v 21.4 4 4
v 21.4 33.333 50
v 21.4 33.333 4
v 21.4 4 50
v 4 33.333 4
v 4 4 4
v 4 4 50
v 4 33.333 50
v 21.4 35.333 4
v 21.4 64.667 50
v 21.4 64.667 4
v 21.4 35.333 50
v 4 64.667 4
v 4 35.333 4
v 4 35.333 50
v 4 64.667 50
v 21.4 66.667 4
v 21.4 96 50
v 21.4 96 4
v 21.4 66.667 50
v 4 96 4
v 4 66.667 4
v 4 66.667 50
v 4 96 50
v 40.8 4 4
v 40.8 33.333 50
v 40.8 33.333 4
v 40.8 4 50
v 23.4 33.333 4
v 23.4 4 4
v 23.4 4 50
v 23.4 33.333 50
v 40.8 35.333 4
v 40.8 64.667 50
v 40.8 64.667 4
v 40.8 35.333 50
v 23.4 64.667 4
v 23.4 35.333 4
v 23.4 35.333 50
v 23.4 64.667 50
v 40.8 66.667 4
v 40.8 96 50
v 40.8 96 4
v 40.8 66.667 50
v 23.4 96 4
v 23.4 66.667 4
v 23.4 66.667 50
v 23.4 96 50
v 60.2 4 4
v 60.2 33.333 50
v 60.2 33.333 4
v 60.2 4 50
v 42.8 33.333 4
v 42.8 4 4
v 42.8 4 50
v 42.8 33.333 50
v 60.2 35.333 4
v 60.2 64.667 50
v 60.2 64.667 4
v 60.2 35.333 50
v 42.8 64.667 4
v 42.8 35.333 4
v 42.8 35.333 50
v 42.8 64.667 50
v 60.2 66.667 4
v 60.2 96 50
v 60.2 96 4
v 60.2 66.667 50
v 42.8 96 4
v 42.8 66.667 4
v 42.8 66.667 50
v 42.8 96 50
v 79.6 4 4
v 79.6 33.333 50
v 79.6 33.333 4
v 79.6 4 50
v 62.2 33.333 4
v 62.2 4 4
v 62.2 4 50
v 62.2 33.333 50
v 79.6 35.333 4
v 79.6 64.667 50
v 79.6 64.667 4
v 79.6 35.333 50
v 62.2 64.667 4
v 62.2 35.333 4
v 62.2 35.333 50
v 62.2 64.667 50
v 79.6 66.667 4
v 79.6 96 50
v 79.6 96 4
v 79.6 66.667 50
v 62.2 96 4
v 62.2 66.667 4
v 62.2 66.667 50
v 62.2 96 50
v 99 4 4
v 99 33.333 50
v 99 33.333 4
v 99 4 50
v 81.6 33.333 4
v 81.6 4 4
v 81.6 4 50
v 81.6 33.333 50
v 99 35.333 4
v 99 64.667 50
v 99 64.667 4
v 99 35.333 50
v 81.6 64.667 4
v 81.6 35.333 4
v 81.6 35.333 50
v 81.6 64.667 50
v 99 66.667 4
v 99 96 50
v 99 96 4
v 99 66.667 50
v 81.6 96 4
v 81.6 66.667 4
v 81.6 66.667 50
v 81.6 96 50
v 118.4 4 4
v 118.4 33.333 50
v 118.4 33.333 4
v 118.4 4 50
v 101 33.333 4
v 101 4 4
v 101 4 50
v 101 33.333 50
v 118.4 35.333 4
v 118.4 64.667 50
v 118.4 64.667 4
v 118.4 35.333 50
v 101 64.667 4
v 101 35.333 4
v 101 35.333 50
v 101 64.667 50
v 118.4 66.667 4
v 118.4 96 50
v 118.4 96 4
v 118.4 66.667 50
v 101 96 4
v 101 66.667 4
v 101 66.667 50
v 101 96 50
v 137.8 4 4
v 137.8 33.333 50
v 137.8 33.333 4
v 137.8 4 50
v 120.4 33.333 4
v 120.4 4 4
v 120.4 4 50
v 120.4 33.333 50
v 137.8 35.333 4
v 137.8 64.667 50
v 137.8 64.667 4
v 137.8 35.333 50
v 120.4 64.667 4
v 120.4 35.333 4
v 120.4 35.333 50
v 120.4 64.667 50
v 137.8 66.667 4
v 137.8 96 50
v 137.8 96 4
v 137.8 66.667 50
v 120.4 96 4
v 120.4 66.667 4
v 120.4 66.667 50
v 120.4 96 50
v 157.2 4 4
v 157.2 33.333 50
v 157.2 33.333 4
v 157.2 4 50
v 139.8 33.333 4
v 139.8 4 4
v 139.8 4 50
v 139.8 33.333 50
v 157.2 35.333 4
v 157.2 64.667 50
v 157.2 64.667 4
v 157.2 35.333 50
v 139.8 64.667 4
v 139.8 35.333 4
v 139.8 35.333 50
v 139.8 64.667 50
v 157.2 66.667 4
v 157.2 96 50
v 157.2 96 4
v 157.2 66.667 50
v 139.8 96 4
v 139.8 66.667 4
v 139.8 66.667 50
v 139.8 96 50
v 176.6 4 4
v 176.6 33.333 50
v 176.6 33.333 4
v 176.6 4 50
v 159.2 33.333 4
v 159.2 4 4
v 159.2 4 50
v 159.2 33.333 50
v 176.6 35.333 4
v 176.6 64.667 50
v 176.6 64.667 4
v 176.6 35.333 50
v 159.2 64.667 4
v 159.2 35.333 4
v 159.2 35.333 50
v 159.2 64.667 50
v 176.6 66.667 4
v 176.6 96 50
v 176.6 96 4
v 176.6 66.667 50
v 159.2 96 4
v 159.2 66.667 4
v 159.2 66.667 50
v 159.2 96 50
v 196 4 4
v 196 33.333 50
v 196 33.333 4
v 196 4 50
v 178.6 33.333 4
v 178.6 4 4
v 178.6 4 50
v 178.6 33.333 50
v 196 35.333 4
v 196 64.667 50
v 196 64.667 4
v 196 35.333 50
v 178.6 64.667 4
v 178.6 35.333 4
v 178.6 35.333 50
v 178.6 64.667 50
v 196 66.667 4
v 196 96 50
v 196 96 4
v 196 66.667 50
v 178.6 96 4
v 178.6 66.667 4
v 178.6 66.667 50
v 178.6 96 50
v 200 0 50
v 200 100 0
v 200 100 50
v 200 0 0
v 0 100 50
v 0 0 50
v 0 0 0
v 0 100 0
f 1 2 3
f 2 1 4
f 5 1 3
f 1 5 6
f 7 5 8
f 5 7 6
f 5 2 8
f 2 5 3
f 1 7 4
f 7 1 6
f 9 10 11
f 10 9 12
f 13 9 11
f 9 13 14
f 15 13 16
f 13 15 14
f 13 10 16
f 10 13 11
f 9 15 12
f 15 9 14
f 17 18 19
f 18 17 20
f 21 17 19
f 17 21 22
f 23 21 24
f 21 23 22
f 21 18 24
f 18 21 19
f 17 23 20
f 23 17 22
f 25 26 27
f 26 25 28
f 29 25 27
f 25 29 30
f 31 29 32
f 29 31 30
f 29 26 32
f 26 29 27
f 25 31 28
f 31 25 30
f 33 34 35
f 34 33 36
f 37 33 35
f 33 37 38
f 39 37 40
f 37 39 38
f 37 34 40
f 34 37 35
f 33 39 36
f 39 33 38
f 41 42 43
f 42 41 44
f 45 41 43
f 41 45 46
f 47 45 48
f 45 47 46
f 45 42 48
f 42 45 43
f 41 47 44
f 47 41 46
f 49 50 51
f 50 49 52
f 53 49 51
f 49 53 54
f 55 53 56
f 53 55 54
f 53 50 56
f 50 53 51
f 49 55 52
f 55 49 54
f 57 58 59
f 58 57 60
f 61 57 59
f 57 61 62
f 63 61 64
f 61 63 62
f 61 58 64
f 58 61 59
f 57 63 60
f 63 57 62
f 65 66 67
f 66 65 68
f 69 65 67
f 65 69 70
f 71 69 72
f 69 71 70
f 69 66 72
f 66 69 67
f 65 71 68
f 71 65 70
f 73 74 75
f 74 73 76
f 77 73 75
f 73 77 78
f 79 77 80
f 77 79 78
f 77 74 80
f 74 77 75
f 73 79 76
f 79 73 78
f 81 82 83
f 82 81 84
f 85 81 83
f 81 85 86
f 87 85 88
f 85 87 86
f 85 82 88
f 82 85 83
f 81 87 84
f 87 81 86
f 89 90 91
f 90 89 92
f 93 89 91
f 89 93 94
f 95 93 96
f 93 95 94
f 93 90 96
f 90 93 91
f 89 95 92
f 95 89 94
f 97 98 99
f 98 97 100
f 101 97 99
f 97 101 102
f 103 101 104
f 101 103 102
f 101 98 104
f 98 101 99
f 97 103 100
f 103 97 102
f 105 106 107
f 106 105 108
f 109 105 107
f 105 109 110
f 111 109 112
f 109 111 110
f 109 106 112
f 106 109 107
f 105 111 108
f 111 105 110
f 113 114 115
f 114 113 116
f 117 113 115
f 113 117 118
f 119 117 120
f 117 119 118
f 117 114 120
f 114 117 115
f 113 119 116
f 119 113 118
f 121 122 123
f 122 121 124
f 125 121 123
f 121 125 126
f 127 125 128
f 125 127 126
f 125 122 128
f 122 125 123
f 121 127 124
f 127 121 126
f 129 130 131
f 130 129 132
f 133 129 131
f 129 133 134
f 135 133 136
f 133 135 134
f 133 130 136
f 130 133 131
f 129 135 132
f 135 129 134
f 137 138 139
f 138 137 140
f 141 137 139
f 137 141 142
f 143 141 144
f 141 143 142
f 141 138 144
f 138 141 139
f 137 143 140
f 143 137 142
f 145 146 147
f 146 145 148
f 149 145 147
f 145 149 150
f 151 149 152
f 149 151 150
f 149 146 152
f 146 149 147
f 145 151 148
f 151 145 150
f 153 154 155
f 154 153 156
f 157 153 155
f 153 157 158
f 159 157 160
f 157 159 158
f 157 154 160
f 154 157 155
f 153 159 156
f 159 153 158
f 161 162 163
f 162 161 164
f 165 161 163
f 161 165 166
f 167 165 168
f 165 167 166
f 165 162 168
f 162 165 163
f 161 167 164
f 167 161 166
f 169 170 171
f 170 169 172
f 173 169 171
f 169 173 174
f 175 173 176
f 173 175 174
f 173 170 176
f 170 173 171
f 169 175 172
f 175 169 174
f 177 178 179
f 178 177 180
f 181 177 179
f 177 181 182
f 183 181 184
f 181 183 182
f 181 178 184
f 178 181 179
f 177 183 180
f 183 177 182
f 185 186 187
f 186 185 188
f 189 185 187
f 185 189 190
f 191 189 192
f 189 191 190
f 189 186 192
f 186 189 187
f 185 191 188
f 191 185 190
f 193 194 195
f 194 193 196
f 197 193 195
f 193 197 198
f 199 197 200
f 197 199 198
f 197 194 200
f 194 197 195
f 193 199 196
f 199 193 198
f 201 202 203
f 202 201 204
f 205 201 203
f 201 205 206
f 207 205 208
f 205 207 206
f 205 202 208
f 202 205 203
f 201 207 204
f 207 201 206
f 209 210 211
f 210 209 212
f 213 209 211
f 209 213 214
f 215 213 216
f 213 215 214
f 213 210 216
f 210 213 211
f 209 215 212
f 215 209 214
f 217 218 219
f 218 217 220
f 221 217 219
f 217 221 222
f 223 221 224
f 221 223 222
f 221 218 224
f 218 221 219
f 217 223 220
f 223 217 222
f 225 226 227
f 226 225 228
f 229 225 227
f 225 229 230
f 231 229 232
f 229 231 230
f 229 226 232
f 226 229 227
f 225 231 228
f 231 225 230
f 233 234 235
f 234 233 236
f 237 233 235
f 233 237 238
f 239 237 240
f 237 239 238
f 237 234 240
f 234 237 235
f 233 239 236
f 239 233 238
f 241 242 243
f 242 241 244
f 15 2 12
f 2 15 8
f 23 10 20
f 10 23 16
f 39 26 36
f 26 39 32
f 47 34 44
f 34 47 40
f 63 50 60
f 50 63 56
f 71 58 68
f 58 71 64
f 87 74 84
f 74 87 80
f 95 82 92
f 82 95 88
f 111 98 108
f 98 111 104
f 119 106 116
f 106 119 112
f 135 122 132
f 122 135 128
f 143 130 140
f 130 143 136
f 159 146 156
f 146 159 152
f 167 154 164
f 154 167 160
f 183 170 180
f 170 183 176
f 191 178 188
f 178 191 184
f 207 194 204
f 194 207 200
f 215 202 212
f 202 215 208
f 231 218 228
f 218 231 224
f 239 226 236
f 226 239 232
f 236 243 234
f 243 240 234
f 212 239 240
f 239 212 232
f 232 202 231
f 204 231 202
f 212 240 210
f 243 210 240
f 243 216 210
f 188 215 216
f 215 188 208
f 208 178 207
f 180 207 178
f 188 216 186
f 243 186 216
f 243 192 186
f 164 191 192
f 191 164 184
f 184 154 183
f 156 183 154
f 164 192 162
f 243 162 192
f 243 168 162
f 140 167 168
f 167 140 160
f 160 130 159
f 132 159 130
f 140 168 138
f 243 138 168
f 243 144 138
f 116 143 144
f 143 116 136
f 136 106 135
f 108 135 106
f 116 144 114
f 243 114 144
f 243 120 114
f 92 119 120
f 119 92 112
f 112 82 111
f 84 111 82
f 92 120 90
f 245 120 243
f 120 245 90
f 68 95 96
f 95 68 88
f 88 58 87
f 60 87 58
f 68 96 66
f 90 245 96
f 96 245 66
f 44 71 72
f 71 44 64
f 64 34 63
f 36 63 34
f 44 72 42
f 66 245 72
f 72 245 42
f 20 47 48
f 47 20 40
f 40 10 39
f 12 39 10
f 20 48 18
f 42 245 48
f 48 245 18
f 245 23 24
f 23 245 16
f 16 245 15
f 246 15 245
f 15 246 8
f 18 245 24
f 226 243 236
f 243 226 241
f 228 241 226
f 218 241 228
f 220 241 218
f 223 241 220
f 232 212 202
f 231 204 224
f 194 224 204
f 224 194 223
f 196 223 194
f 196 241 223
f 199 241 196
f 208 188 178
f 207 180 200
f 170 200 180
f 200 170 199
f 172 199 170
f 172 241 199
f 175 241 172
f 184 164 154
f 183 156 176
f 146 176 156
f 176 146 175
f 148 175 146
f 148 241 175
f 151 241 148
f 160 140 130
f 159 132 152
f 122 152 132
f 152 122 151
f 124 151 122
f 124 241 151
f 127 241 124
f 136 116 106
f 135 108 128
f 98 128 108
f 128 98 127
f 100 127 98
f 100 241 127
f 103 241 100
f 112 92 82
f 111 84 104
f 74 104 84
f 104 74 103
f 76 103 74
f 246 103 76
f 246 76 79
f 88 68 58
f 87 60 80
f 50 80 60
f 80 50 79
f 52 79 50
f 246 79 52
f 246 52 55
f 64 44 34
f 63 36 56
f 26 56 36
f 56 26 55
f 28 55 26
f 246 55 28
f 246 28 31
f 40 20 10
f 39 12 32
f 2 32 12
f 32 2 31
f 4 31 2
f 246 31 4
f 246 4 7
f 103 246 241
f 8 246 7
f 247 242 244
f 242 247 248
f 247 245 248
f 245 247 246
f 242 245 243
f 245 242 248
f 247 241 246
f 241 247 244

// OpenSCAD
/* [Box dimensions] */
// External length (X)
lg = 200;
// External width (Y)
wd = 100;
// External heigth (Z)
ht = 50;

/* [Thickness] */
// External thickness
extTk = 4;
// Internal thickness
intTk = 2;

/* [Dividers] */
// Number divider on axe X
divX = 10;
// Number divider on axe Y
divY = 3;

difference()
{
    // External box
    cube([lg,wd,ht]);
    
    // Internal length (X)
    sizeX = (lg - extTk*2 - intTk*(divX-1))/divX;
    // Internal width (Y)
    sizeY = (wd - extTk*2 - intTk*(divY-1))/divY;
    // Internal heigth (Z)
    sizeZ = ht - extTk + 0.1;
    
    // Holes
    for (vX=[0:divX-1], vY=[0:divY-1])
        translate([extTk+vX*(sizeX+intTk),extTk+vY*(sizeY+intTk),extTk])
        cube([sizeX, sizeY, sizeZ]);
}
